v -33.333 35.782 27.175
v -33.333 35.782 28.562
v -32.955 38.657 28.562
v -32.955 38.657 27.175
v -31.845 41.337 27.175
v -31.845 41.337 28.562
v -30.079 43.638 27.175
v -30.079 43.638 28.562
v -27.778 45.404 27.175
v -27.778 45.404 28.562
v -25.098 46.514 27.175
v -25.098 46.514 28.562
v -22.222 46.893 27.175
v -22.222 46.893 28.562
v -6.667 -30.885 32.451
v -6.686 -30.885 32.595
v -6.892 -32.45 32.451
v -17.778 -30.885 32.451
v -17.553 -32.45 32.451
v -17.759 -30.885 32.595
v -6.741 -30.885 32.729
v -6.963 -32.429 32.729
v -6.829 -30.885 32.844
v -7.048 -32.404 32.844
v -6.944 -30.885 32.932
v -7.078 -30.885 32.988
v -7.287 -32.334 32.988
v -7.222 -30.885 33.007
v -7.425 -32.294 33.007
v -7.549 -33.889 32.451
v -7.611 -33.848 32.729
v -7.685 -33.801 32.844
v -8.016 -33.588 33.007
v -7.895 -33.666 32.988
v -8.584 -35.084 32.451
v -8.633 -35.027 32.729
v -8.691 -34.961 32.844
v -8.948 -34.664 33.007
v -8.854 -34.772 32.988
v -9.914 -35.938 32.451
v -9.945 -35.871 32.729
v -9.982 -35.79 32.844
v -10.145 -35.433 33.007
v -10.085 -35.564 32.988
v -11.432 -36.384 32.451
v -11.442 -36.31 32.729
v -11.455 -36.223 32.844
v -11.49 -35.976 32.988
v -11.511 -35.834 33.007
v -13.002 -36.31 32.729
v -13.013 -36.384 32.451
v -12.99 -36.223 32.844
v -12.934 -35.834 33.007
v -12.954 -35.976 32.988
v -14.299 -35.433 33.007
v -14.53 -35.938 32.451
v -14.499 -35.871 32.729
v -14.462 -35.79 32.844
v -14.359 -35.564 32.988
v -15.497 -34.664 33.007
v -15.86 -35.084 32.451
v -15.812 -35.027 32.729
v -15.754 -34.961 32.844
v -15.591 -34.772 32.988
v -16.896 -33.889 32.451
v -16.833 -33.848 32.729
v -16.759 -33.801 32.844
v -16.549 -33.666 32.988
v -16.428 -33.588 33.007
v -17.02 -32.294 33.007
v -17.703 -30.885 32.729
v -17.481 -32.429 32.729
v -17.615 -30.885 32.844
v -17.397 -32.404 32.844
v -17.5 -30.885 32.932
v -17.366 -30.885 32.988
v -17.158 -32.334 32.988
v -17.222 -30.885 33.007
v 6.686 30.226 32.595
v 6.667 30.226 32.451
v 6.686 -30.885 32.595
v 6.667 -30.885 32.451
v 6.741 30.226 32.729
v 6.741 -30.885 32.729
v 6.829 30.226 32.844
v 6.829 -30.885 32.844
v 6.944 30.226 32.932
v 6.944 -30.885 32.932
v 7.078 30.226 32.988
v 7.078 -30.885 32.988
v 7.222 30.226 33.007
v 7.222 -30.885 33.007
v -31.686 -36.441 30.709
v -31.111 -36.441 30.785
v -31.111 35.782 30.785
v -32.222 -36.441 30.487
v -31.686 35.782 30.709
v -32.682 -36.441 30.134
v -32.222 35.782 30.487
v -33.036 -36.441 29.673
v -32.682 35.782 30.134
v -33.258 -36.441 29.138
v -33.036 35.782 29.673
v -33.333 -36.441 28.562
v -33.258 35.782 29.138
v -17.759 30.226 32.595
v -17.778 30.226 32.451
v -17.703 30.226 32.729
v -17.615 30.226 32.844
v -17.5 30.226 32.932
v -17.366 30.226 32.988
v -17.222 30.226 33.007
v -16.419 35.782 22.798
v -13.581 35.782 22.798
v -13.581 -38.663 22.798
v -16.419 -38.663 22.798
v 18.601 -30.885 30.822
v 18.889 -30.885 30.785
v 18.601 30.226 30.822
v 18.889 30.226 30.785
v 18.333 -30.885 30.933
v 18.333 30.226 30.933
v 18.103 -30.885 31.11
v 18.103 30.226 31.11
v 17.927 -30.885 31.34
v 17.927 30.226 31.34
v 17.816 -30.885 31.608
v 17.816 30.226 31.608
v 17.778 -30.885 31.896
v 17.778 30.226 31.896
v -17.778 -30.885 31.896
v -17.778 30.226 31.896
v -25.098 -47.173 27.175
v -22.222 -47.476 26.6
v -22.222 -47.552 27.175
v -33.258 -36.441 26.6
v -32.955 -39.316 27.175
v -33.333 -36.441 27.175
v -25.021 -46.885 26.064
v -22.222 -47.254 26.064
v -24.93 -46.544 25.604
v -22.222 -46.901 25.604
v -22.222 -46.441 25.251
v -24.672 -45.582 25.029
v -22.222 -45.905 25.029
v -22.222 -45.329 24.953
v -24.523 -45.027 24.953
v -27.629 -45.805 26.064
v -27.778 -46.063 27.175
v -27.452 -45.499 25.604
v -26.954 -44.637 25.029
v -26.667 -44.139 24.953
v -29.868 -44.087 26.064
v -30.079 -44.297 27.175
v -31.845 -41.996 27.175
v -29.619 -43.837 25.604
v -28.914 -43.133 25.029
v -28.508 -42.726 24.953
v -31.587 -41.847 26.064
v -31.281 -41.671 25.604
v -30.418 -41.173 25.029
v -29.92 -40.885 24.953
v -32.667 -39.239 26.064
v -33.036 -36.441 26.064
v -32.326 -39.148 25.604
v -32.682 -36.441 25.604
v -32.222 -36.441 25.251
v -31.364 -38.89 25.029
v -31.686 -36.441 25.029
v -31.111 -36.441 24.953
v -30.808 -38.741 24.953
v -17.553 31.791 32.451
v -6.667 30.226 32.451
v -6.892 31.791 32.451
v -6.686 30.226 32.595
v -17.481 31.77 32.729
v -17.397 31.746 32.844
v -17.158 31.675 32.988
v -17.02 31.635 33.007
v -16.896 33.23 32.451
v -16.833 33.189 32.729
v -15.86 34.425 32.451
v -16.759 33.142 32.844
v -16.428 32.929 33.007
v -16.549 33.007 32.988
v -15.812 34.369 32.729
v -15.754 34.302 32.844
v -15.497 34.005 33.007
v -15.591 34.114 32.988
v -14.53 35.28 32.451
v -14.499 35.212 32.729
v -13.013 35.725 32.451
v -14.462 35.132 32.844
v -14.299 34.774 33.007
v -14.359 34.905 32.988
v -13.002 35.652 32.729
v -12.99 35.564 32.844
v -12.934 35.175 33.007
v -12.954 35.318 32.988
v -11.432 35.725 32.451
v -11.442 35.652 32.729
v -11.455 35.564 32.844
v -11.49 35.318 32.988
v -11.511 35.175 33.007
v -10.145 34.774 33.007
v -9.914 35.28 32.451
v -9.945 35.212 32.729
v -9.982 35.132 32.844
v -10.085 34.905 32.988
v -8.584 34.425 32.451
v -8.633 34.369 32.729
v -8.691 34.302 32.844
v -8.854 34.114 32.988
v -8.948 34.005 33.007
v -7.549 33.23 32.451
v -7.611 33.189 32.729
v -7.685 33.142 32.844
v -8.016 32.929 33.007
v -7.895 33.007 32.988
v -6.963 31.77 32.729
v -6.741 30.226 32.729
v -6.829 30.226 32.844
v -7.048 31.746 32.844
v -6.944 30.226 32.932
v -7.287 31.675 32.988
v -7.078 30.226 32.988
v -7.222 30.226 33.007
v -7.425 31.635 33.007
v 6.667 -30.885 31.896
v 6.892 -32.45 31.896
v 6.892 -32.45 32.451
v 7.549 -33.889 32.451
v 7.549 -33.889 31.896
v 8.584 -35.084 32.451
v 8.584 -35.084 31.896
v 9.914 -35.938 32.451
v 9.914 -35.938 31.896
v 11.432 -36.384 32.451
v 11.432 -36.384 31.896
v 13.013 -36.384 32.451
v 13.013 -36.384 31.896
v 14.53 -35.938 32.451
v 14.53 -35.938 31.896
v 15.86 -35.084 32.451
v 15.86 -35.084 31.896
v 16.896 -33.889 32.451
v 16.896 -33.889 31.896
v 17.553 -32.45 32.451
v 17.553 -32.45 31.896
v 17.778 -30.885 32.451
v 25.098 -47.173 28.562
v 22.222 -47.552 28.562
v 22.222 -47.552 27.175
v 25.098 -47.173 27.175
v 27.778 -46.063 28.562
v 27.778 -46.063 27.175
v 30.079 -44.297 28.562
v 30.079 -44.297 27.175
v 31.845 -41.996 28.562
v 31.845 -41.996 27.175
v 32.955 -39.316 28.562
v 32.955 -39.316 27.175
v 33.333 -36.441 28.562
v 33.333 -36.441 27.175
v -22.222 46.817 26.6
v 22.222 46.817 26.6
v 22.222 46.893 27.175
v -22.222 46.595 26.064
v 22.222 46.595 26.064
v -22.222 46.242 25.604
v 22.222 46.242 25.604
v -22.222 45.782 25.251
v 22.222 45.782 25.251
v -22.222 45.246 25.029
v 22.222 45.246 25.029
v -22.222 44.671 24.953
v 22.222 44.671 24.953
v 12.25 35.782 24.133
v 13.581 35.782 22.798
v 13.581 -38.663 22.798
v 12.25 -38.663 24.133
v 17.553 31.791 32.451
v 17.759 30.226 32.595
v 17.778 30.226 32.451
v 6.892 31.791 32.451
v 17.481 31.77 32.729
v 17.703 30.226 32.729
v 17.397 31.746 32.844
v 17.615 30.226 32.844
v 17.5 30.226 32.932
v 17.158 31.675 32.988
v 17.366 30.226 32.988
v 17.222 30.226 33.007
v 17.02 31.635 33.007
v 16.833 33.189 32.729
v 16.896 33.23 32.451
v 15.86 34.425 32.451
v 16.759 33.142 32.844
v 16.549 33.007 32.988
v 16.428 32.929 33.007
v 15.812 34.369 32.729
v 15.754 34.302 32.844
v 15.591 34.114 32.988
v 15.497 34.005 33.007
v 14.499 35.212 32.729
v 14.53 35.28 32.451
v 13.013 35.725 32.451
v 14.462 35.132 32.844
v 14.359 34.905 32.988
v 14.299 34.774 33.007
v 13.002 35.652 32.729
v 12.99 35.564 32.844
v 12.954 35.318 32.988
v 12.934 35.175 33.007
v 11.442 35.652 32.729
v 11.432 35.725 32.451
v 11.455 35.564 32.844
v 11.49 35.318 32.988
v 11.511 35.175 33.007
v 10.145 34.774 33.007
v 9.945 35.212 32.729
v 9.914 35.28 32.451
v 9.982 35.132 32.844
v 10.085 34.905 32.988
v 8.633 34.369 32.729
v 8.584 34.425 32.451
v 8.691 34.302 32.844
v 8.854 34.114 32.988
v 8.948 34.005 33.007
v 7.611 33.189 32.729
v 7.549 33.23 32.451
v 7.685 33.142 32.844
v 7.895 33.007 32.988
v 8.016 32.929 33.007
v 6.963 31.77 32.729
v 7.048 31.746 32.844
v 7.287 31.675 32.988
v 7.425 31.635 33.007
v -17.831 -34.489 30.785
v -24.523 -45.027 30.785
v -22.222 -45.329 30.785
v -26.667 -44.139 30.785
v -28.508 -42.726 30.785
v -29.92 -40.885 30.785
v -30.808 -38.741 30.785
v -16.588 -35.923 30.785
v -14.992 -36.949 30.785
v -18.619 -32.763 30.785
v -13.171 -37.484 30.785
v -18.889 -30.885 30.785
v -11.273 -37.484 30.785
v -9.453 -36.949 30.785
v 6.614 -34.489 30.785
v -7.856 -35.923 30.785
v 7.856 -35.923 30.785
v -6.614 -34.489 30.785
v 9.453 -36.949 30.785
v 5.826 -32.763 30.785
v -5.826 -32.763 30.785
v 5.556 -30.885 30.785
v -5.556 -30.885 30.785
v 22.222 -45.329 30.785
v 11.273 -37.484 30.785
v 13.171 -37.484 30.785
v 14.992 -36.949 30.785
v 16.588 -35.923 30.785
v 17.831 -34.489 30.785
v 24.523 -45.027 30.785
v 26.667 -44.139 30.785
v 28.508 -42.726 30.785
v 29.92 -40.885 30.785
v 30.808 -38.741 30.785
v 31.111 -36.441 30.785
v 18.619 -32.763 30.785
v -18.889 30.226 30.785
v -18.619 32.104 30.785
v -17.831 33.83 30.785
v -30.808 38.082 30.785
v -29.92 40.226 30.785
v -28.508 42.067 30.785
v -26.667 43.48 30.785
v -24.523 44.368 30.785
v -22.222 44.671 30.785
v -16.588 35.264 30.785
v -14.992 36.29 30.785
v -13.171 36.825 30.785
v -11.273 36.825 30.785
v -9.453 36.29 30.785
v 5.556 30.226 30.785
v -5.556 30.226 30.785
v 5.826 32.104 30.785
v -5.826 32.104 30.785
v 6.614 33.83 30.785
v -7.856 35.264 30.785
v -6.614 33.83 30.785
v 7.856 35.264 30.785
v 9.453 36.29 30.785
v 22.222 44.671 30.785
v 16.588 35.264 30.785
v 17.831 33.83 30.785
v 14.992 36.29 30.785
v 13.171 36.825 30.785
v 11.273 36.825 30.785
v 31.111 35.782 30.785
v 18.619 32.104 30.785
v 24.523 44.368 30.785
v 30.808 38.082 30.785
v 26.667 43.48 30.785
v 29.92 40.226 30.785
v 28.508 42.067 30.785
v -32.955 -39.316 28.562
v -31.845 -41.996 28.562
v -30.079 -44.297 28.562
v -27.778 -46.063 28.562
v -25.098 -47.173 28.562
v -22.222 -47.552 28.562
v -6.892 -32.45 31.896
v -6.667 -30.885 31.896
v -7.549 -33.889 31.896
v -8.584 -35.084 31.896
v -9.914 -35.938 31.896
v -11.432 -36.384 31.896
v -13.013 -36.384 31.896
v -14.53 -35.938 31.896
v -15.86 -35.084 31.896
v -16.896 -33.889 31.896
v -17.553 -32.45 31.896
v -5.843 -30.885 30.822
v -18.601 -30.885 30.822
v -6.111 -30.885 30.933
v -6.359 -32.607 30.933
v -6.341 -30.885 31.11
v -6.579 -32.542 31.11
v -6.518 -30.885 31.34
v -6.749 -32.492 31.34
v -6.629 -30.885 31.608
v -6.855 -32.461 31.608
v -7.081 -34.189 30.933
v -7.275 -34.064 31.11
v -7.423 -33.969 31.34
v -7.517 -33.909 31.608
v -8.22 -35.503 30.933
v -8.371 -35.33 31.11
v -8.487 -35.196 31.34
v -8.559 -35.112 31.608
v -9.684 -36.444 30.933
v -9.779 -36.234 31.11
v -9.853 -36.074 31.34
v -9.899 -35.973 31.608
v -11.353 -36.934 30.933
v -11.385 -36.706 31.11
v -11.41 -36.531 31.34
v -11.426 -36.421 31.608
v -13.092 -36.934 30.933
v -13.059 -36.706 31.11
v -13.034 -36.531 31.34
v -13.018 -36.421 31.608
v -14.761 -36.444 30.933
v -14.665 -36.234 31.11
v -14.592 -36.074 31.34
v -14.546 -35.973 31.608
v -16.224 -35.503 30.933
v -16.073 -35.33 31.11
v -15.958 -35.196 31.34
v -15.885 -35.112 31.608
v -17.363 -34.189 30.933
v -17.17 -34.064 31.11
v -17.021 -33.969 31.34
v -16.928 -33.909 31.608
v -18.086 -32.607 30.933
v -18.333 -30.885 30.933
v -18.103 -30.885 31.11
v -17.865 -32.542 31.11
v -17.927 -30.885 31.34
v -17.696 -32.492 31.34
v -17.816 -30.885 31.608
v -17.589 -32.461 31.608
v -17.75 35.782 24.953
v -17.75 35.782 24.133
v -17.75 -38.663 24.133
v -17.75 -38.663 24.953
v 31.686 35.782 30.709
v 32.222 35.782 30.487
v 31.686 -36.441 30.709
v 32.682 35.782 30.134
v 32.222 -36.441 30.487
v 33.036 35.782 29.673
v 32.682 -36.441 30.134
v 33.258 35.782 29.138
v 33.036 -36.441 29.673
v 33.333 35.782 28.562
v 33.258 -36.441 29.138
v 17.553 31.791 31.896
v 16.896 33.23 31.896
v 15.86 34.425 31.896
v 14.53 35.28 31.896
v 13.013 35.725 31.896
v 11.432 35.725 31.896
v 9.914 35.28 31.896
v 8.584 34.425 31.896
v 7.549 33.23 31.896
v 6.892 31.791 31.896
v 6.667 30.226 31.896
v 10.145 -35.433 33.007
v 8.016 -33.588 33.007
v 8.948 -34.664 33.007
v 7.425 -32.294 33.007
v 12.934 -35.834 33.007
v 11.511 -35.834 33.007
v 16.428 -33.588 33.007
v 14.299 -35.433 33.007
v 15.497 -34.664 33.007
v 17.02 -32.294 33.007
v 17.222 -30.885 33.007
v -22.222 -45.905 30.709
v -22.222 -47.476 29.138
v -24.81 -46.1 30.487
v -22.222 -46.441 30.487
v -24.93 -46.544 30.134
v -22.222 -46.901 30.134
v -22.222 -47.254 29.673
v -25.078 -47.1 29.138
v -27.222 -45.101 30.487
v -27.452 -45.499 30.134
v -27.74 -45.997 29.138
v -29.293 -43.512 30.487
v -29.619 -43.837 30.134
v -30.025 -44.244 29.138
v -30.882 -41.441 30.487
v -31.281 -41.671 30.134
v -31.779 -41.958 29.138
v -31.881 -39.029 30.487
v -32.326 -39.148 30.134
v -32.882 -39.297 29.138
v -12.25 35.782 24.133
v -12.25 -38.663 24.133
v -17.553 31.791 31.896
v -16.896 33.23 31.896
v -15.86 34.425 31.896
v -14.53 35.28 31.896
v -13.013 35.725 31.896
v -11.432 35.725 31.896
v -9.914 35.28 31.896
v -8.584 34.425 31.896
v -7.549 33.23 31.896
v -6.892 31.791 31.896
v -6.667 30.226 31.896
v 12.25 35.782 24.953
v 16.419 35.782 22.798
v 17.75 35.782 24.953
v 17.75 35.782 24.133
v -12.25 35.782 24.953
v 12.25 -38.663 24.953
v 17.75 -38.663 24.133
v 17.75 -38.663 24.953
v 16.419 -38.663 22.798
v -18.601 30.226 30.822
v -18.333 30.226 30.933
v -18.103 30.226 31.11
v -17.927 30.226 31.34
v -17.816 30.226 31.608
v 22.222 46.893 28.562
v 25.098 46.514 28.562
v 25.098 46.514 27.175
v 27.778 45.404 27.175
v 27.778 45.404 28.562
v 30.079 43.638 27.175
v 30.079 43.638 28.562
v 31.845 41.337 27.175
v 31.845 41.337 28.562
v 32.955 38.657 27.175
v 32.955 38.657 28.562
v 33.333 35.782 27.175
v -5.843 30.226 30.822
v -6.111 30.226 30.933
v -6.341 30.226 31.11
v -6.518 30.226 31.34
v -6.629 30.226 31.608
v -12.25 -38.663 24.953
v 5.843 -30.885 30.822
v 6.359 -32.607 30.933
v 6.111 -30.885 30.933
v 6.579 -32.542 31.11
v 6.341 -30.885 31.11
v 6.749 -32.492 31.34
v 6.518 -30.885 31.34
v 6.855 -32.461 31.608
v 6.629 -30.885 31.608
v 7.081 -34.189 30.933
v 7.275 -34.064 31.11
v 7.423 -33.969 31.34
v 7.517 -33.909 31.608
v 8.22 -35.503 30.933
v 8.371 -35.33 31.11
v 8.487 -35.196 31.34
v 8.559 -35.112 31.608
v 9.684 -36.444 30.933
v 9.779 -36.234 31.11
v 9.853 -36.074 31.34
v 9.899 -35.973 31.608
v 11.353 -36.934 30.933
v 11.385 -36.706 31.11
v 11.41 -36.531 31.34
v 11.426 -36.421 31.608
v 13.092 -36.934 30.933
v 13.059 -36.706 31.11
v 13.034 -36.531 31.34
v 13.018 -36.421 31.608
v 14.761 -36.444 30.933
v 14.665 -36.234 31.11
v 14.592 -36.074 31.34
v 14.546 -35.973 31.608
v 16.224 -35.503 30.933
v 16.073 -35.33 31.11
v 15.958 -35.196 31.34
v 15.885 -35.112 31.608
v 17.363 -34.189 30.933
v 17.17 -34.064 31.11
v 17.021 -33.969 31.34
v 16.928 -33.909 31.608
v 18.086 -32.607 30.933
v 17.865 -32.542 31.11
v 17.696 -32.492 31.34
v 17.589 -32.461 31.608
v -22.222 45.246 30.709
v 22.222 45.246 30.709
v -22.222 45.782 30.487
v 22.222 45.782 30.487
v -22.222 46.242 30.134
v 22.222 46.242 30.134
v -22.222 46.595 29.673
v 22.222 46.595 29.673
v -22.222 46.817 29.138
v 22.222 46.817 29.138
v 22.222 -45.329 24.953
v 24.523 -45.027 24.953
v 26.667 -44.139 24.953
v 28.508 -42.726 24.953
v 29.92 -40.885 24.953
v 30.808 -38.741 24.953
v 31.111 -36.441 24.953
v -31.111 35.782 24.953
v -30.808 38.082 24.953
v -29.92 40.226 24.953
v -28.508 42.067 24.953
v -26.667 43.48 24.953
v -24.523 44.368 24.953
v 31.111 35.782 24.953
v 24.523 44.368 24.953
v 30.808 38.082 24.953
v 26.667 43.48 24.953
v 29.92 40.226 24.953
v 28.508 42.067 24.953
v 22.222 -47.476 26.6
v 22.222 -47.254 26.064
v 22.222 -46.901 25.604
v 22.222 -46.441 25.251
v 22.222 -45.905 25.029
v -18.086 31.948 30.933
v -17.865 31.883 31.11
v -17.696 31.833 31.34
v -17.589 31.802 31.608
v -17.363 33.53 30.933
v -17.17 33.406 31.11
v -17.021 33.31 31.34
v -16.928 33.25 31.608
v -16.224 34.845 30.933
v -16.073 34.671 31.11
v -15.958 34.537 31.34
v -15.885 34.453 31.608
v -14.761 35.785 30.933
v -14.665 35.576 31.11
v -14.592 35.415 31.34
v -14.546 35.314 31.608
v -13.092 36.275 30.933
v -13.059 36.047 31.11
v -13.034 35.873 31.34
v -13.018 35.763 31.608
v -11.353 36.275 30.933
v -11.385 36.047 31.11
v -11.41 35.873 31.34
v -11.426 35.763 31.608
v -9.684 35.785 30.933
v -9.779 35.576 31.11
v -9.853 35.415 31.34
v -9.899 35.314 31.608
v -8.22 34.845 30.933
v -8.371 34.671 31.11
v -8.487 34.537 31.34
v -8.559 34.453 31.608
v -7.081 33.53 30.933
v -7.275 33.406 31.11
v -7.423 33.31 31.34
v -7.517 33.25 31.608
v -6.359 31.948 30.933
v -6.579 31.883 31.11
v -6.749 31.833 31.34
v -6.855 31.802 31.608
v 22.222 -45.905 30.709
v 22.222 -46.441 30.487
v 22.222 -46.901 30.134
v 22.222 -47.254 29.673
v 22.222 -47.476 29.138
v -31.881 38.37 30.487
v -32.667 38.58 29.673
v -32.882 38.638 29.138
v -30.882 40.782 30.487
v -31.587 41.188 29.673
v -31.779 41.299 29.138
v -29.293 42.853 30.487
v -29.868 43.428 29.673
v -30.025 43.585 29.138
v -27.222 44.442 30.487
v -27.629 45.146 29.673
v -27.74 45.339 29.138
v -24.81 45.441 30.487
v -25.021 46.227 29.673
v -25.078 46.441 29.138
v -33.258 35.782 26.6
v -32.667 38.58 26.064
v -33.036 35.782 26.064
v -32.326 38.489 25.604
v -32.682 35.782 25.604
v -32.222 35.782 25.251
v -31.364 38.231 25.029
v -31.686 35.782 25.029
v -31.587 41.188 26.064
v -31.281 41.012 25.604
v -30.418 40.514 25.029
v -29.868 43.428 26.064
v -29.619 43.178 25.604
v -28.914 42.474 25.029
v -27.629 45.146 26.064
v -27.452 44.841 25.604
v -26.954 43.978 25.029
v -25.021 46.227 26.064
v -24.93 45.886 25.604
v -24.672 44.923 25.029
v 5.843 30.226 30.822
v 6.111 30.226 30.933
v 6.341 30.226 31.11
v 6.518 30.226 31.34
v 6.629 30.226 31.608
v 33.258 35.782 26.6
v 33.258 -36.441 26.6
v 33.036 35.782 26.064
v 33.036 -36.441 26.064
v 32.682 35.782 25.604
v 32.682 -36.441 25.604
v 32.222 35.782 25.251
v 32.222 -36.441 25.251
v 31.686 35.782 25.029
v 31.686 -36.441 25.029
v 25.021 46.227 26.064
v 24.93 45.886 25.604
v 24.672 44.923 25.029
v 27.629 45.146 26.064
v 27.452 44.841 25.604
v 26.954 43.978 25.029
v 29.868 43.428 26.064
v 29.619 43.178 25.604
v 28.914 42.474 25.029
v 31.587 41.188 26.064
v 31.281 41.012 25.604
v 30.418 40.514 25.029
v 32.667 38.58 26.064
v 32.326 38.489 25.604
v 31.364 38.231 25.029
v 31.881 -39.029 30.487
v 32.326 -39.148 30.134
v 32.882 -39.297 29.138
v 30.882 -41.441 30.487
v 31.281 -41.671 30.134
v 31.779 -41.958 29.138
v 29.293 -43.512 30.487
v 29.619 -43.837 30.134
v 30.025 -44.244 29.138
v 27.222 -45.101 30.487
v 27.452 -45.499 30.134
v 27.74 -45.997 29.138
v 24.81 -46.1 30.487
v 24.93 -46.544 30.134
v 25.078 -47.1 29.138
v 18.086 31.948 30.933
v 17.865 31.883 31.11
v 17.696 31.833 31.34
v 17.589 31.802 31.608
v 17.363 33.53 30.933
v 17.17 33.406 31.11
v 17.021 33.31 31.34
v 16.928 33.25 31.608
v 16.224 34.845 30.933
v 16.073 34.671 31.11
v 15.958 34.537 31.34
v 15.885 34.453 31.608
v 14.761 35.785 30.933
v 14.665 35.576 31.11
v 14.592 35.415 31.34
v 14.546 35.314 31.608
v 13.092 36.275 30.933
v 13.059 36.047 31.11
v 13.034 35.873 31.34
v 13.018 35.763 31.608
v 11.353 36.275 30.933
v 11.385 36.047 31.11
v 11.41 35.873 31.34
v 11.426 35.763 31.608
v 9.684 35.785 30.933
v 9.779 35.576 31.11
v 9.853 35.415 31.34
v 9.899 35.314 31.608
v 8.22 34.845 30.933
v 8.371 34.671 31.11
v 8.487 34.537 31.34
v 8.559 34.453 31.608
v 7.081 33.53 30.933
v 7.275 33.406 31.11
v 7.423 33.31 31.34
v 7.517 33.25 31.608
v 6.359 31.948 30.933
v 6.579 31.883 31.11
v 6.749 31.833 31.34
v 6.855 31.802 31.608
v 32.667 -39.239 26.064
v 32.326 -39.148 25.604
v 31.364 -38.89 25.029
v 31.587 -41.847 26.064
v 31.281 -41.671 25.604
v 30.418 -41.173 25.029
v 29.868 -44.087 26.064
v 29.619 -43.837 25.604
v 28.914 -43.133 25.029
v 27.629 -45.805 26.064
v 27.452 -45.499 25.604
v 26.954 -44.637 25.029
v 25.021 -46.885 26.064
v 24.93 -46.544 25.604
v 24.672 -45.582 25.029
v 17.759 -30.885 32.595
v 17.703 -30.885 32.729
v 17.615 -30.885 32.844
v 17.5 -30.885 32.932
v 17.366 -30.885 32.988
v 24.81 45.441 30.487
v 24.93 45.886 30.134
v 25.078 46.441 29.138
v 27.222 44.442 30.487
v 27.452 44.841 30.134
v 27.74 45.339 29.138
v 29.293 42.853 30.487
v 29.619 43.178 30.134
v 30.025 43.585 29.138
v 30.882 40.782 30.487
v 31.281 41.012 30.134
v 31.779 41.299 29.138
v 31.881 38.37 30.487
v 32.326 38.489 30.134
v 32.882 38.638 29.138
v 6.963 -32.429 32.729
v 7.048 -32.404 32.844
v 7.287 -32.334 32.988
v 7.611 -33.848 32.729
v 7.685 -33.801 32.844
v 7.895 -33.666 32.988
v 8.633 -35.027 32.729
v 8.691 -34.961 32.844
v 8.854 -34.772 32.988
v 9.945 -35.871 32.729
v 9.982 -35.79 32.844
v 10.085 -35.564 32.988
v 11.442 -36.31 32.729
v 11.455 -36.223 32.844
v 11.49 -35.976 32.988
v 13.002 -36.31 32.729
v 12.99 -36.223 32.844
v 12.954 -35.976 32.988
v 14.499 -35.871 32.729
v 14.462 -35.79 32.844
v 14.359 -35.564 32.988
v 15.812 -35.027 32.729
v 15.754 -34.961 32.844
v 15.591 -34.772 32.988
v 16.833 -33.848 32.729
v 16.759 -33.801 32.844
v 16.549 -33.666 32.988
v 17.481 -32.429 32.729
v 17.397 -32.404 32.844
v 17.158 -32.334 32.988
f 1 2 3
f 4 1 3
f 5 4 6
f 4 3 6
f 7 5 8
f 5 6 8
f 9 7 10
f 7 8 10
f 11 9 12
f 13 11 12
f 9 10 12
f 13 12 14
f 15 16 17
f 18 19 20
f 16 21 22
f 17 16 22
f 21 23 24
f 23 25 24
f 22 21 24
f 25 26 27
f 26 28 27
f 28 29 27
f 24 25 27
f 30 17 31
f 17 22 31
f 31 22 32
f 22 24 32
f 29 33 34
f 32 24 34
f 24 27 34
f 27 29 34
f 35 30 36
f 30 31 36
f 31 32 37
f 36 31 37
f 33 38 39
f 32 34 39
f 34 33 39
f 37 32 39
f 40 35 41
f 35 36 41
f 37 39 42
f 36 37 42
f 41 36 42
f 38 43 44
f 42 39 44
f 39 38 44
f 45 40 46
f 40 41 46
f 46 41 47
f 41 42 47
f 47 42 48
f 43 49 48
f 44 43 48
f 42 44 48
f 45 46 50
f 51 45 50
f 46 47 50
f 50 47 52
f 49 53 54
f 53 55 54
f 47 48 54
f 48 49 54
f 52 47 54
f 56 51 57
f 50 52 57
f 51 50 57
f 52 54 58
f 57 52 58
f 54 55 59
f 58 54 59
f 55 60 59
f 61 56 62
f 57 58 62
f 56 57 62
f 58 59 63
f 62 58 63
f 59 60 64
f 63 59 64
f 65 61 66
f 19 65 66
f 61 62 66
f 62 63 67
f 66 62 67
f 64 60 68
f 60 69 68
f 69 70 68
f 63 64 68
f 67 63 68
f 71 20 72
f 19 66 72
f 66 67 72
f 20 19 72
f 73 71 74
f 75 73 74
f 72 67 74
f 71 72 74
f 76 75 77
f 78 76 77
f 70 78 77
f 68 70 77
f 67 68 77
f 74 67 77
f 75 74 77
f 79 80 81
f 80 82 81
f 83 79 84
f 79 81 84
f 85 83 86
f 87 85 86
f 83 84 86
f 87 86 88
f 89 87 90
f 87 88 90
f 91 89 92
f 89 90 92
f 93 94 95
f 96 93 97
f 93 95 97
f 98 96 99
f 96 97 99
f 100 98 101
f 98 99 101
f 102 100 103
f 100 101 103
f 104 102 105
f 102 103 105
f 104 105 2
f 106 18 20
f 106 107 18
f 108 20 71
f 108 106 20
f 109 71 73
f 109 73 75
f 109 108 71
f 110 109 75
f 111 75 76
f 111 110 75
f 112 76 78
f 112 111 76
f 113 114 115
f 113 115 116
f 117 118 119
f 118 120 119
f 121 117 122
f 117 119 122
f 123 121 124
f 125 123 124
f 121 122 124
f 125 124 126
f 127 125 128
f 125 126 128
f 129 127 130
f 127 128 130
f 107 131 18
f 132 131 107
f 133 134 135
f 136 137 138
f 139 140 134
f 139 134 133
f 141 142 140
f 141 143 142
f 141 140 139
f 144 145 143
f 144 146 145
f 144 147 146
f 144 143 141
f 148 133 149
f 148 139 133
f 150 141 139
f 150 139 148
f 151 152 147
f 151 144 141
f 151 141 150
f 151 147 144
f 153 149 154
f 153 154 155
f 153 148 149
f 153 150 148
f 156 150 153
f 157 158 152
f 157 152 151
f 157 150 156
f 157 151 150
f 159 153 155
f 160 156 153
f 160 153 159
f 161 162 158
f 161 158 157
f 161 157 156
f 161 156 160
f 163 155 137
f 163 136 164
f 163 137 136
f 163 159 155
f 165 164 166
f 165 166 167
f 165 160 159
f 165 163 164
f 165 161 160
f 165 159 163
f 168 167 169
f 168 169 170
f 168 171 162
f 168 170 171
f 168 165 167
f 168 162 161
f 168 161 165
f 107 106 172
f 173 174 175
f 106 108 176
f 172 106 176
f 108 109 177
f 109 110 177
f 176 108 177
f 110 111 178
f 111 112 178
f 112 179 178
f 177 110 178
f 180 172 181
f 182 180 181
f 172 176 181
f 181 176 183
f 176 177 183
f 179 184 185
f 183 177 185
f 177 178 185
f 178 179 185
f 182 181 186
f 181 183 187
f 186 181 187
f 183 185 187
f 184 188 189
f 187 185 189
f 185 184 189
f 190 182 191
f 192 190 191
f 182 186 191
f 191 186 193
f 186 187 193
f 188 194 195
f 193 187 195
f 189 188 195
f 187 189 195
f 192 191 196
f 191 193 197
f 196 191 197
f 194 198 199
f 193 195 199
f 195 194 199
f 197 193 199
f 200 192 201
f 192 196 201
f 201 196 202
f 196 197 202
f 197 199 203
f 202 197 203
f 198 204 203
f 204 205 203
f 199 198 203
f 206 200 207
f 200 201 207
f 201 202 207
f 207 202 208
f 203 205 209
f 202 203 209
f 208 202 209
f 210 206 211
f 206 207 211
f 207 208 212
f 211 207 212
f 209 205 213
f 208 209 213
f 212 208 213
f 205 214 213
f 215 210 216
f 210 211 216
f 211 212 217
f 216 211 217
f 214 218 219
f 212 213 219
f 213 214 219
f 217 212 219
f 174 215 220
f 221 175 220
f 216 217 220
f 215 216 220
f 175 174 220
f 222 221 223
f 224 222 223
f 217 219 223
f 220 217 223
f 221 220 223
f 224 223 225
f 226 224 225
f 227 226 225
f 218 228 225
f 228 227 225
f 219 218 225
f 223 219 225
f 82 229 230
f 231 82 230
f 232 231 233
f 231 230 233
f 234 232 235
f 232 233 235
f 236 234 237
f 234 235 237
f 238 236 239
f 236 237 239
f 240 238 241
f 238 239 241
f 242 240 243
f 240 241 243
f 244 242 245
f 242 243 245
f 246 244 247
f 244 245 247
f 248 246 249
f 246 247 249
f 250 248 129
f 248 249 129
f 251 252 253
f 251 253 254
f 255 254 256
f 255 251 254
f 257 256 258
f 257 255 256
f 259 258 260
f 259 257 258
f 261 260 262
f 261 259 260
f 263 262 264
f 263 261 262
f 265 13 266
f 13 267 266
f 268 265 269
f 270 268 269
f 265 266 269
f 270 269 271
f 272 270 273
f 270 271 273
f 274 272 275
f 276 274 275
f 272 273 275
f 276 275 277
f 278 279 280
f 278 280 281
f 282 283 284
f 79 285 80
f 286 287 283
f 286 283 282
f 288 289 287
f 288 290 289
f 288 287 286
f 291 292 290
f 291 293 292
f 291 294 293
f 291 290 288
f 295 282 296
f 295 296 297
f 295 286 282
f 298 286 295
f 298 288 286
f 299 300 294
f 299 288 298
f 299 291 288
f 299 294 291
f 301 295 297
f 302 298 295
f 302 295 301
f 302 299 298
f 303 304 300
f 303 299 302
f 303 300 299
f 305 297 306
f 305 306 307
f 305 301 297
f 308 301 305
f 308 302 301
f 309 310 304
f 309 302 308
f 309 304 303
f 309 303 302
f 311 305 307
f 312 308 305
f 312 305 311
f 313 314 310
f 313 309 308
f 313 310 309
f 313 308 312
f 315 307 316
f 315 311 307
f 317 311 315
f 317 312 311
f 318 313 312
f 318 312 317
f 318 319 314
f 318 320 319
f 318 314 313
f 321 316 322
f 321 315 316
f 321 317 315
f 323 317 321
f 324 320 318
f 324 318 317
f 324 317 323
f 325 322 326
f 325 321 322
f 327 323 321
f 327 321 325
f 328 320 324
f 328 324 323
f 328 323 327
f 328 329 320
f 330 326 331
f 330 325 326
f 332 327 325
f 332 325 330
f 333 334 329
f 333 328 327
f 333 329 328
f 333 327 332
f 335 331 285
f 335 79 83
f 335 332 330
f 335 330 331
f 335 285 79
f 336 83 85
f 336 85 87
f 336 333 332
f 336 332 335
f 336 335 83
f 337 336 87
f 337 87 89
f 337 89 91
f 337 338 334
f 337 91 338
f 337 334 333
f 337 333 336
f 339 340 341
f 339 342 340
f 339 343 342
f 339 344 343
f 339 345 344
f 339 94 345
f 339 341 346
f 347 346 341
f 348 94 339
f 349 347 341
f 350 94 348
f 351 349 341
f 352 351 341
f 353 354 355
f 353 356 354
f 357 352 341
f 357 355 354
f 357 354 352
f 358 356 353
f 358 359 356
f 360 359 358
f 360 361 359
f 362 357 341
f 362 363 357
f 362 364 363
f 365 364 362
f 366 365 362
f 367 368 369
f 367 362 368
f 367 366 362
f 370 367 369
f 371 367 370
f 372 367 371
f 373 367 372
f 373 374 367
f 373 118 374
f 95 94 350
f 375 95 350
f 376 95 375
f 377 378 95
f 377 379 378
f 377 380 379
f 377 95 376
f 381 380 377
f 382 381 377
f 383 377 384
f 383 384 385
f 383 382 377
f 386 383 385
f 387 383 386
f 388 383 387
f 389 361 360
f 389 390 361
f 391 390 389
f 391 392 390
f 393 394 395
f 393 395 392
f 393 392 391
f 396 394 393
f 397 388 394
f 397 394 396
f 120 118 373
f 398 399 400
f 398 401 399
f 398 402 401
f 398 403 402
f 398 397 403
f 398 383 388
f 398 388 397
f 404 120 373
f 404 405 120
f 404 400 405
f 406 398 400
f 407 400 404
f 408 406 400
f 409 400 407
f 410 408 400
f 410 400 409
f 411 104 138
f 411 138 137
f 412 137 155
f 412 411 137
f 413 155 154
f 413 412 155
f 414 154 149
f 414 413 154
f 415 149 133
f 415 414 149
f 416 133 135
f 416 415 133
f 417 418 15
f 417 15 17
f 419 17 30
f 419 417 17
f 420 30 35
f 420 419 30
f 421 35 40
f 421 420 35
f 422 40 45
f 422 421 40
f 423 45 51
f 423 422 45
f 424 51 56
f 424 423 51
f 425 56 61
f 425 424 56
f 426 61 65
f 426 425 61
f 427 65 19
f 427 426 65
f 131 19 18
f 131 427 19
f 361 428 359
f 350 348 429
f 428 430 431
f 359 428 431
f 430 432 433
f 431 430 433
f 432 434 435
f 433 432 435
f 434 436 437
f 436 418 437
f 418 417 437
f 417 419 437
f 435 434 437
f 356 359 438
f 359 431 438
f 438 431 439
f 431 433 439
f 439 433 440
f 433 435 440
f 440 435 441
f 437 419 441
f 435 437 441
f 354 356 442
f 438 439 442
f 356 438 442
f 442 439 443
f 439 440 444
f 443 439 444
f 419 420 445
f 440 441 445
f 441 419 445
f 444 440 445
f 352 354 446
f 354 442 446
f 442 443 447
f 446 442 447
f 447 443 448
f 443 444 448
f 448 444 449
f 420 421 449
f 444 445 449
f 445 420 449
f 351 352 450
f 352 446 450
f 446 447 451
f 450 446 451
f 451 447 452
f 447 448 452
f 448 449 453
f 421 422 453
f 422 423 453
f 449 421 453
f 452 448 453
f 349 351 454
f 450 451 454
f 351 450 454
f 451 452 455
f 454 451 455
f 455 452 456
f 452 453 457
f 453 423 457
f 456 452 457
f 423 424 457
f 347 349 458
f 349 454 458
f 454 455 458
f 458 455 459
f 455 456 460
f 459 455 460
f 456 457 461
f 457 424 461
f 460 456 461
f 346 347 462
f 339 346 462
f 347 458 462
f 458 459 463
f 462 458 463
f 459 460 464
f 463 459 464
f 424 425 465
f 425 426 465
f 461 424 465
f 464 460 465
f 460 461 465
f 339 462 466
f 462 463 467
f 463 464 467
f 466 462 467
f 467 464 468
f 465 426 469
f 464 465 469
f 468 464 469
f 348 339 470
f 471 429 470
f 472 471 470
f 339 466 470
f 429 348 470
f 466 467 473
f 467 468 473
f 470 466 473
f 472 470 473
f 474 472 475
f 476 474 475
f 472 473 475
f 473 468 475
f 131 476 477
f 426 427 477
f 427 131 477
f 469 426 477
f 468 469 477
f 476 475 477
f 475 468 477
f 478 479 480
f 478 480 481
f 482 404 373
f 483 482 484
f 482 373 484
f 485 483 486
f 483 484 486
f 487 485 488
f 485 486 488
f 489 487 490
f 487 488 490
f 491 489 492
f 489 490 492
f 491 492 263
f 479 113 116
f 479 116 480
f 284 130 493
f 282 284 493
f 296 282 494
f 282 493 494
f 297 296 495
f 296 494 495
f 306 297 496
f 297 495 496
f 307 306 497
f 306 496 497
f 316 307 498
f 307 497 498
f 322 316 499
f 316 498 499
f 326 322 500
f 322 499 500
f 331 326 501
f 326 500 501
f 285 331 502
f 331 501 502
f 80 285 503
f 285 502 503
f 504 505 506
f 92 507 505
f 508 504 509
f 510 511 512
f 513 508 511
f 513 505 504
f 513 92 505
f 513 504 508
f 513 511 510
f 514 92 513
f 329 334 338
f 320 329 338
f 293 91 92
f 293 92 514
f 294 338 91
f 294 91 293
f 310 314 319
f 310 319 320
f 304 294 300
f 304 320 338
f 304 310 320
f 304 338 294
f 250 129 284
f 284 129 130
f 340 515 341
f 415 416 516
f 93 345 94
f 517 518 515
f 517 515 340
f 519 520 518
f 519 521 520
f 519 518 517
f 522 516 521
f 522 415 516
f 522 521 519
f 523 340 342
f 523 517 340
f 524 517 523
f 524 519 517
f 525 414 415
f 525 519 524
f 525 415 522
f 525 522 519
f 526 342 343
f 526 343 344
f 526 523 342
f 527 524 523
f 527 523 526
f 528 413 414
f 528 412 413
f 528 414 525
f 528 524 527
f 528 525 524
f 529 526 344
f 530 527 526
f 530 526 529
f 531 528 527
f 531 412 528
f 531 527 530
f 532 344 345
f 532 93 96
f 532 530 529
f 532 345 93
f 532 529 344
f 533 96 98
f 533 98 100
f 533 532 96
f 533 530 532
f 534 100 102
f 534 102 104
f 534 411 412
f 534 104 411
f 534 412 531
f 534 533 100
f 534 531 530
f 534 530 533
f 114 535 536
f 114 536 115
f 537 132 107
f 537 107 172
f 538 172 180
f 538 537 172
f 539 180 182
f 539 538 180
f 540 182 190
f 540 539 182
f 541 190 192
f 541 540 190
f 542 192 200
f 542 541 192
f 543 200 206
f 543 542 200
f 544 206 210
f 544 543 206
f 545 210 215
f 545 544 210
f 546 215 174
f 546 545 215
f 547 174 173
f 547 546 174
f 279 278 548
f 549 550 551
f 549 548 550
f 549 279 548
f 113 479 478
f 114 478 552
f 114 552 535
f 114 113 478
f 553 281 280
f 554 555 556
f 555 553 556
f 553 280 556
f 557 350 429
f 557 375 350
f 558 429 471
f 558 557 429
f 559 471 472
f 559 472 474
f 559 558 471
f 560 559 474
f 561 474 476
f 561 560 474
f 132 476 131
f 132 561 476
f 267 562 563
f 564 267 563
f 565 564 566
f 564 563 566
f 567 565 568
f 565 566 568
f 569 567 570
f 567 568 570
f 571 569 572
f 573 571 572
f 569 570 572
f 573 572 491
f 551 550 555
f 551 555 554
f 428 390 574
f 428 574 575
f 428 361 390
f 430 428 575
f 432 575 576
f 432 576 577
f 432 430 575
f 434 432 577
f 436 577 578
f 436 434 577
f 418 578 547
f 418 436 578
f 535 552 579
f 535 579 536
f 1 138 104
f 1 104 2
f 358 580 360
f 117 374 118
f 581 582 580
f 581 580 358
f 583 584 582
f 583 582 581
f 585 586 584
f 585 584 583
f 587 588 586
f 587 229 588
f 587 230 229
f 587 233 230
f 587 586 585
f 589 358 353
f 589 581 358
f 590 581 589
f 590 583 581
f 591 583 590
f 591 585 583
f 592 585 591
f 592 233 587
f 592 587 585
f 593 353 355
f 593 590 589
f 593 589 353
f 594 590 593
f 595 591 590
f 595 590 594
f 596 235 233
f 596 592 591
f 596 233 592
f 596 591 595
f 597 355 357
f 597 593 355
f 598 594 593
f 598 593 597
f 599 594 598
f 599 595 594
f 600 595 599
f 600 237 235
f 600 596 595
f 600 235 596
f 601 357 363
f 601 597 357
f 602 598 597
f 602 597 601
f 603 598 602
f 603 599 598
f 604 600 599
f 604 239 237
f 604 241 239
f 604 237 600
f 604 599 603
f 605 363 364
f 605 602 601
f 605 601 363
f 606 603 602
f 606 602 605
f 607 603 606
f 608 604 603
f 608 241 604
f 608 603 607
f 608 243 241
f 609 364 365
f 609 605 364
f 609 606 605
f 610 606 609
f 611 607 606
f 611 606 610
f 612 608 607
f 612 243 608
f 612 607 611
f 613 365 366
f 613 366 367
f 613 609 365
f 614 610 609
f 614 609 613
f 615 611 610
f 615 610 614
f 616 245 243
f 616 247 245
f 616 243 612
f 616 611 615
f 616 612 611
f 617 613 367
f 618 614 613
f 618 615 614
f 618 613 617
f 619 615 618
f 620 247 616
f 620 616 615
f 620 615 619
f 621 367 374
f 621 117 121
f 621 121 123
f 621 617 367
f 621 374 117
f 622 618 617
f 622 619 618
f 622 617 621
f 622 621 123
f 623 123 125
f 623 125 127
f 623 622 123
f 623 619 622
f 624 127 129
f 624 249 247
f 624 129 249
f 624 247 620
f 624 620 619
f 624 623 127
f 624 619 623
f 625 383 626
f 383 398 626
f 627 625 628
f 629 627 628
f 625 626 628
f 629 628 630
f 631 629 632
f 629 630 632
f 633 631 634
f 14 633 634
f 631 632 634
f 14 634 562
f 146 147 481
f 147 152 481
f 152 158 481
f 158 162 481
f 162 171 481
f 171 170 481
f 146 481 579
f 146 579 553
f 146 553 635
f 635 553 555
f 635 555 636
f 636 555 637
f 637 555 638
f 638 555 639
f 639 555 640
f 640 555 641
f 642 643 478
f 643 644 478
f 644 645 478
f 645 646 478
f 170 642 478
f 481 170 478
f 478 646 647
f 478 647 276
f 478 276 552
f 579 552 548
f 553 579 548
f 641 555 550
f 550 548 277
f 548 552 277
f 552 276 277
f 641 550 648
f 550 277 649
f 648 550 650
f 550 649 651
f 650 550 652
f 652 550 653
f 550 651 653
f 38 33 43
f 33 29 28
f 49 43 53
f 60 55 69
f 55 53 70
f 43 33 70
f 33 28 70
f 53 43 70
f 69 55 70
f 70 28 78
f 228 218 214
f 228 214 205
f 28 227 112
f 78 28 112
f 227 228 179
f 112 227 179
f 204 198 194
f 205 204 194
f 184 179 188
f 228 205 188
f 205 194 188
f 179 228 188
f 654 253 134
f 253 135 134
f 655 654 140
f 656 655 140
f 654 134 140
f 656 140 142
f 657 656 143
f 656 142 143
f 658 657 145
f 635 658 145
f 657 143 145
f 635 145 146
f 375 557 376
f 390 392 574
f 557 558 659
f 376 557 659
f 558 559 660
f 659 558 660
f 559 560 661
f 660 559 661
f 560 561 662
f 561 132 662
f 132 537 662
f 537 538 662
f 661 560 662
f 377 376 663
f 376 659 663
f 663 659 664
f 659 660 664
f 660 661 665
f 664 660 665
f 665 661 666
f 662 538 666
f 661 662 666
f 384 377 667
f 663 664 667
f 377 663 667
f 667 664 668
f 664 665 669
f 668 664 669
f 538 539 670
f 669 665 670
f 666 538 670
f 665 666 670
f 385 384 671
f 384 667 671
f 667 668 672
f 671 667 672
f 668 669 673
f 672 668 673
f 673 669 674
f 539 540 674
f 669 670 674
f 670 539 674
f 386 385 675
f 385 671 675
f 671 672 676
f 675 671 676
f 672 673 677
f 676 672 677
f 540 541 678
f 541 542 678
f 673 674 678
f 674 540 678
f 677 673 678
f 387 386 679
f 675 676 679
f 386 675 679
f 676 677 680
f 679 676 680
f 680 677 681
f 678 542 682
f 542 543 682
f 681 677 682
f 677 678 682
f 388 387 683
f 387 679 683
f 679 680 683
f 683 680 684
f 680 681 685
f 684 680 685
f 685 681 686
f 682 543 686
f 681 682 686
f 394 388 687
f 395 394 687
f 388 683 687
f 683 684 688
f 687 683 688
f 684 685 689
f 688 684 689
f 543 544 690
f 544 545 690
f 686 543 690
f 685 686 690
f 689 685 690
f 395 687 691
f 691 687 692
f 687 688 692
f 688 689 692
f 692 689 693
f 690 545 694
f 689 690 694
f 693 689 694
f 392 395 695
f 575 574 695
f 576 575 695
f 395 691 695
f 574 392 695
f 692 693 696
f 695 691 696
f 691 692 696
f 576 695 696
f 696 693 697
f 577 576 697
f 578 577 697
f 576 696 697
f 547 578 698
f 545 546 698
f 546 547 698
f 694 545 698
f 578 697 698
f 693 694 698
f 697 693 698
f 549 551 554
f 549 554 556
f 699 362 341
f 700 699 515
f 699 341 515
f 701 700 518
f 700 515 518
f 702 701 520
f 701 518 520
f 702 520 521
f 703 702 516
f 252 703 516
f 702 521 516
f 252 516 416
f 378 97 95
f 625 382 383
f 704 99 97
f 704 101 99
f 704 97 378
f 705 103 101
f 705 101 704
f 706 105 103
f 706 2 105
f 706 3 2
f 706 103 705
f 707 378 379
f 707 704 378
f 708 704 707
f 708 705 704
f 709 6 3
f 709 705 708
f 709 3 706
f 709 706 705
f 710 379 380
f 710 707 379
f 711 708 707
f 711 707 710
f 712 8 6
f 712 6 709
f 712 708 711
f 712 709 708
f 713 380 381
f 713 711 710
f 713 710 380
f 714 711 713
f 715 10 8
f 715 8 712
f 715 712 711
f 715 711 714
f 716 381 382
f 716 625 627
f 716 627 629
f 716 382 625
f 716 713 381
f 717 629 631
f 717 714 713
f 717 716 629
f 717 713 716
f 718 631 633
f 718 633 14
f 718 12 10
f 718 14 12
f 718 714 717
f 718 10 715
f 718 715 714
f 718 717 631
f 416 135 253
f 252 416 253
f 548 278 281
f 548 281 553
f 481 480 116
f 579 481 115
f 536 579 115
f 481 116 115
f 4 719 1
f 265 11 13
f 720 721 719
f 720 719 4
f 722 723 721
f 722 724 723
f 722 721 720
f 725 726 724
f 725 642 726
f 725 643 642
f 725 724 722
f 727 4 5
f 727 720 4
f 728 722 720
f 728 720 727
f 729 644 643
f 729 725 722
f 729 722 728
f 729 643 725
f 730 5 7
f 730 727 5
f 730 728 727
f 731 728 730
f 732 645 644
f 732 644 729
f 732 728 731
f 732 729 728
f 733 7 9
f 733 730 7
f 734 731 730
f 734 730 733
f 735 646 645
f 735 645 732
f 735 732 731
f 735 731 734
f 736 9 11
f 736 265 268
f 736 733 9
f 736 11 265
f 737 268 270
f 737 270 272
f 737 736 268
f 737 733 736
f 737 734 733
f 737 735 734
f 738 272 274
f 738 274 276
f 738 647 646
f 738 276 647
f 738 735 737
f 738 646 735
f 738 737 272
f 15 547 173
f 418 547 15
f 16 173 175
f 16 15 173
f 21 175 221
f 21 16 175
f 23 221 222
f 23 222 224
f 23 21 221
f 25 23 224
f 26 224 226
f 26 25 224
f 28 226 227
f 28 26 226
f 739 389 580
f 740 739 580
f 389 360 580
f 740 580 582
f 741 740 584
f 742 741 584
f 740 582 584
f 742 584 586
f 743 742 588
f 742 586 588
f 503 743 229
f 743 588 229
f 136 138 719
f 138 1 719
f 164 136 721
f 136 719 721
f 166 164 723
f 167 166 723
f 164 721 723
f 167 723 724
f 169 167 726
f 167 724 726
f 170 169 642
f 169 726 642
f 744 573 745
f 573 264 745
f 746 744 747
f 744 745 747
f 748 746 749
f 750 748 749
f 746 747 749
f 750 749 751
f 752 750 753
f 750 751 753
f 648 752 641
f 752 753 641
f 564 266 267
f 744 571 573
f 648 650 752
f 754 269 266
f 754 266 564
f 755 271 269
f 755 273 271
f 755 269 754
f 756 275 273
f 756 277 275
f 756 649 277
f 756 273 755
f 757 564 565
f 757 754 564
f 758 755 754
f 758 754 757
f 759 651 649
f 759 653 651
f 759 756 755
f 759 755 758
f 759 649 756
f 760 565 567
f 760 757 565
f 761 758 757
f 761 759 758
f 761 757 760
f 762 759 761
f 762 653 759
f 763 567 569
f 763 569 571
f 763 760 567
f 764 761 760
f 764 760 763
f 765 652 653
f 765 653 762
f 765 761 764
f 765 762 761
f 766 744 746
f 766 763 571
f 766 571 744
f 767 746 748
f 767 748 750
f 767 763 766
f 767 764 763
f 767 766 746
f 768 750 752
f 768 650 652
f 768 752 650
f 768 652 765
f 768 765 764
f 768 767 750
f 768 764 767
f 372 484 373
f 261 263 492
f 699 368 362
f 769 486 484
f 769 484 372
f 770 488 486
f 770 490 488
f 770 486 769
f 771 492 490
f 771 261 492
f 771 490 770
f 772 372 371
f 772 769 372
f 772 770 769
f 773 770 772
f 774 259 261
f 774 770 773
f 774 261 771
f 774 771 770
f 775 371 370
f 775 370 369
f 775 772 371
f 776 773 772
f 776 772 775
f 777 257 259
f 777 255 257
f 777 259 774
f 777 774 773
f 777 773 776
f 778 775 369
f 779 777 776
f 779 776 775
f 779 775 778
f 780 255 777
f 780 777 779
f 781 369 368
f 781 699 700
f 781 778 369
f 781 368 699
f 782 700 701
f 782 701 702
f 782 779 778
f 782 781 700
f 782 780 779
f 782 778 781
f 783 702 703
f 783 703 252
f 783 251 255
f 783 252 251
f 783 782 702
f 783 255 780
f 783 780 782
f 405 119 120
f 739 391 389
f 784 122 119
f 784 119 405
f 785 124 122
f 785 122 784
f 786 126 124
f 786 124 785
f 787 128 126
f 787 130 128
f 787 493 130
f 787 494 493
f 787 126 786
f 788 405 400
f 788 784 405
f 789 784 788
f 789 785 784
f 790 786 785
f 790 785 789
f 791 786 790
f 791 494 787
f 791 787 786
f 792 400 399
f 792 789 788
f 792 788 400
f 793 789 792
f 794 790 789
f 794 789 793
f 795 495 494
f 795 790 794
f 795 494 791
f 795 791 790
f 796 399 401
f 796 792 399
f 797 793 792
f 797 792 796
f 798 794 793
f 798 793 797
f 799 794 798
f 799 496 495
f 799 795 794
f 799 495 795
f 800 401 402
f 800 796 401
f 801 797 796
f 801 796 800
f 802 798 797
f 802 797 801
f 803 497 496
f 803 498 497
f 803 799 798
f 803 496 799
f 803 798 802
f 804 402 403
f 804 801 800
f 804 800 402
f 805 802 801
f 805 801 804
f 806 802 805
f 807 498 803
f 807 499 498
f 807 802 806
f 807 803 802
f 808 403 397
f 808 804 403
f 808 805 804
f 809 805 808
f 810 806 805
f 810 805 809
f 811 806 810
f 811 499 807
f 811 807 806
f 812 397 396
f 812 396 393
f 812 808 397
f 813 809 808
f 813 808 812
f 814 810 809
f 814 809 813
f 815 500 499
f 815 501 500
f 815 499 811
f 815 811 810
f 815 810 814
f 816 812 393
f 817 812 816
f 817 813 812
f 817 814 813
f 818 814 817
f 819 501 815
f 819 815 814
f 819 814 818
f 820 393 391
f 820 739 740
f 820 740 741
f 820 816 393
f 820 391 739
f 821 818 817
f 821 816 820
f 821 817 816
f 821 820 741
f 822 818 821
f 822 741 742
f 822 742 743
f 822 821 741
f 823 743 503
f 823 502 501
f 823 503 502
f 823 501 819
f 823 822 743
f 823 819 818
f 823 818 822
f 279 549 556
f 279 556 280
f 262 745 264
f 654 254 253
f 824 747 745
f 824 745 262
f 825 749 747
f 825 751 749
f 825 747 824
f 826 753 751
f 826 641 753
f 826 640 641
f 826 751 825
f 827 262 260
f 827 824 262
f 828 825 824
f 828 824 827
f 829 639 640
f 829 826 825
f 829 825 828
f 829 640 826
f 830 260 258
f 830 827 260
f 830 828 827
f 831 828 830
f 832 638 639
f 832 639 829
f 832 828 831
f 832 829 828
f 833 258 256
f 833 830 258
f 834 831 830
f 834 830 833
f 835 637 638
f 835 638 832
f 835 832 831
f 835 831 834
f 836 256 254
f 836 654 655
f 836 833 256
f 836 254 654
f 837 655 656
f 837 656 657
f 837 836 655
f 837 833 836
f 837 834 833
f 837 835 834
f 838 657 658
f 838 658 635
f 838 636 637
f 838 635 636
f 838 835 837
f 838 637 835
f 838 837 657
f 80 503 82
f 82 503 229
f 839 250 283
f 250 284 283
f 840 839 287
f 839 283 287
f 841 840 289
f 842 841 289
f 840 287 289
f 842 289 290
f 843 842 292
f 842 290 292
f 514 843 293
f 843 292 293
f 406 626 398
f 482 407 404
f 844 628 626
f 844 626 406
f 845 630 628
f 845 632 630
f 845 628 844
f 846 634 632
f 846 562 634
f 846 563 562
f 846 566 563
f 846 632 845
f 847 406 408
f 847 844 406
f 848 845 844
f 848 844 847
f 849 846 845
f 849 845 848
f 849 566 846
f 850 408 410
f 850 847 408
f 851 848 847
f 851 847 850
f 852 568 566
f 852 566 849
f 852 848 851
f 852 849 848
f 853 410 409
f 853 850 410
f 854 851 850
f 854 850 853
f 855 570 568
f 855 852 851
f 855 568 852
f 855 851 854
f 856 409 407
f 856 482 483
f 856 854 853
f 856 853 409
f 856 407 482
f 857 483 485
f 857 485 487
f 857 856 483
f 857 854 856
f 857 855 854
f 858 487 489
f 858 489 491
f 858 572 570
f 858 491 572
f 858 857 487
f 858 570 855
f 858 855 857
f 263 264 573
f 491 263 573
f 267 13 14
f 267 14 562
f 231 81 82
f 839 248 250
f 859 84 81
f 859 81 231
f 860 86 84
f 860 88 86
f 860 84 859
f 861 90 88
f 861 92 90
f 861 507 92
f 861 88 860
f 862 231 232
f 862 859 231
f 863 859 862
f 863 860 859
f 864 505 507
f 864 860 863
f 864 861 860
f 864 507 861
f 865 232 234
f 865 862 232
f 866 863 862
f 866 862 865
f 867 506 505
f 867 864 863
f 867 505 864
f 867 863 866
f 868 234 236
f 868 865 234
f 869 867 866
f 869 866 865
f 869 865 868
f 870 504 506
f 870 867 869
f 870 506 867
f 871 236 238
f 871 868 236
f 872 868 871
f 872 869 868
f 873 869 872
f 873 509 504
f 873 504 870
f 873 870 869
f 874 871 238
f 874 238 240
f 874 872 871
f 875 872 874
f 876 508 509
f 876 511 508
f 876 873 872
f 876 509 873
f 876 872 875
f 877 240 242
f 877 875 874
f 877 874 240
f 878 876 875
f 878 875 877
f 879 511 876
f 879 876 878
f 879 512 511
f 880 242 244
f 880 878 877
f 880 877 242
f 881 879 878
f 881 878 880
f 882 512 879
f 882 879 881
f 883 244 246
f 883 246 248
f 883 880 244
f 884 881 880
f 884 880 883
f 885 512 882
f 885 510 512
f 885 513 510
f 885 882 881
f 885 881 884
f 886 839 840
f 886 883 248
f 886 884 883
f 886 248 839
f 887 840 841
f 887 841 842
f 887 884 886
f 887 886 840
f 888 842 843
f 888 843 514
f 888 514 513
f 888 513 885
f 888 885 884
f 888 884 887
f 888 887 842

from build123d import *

# Parameters (mm, degrees)
SKETCH_1_W      = 600
SKETCH_1_H      = 850
EXTRUDE_1_DEPTH = 52.484908593
EXTRUDE_2_DEPTH = 20
FILLET_1_R      = 100
FILLET_2_R      = 10
FILLET_3_R      = 5
FILLET_4_R      = 20
EXTRUDE_START   = -100
EXTRUDE_3_DEPTH = 670
SCALE_1_SCALE   = 0.111111111


with BuildPart() as part:
    # 草图1 → 凸台-拉伸1 (new body)
    with BuildSketch(Plane.XY):
        Rectangle(SKETCH_1_W, SKETCH_1_H)
    extrude(amount=EXTRUDE_1_DEPTH)

    # 草图2 → 凸台-拉伸2 (add)
    with BuildSketch(Plane.XY.offset(52.484908593)):
        with BuildLine():
            Line((-60, 275), (-60, -275))
            ThreePointArc((-60, -275), (-110, -325), (-160, -275))
            Line((-160, -275), (-160, 275))
            ThreePointArc((-160, 275), (-110, 325), (-60, 275))
        make_face()
        with BuildLine():
            Line((60, 275), (60, -275))
            ThreePointArc((60, -275), (110, -325), (160, -275))
            Line((160, -275), (160, 275))
            ThreePointArc((160, 275), (110, 325), (60, 275))
        make_face()
    extrude(amount=EXTRUDE_2_DEPTH)

    # 圆角1
    fillet_1_edges = [part.edges().sort_by_distance(p)[0] for p in [
        (300, -425, 26.242454296),
        (-300, -425, 26.242454296),
        (-300, 425, 26.242454296),
        (300, 425, 26.242454296),
    ]]
    fillet(fillet_1_edges, radius=FILLET_1_R)

    # 圆角2
    fillet_2_edges = [part.edges().sort_by_distance(p)[0] for p in [
        (-110, 325, 52.484908593),
        (-160, 0, 52.484908593),
        (-110, -325, 52.484908593),
        (-60, 0, 52.484908593),
        (110, 325, 52.484908593),
        (60, 0, 52.484908593),
        (110, -325, 52.484908593),
        (160, 0, 52.484908593),
    ]]
    fillet(fillet_2_edges, radius=FILLET_2_R)

    # 圆角3
    fillet_3_edges = [part.edges().sort_by_distance(p)[0] for p in [
        (-110, 325, 72.484908593),
        (-160, 0, 72.484908593),
        (-110, -325, 72.484908593),
        (-60, 0, 72.484908593),
        (110, 325, 72.484908593),
        (60, 0, 72.484908593),
        (110, -325, 72.484908593),
        (160, 0, 72.484908593),
    ]]
    fillet(fillet_3_edges, radius=FILLET_3_R)

    # 圆角4
    fillet_4_edges = [part.edges().sort_by_distance(p)[0] for p in [
        (0, 425, 0),
        (0, 425, 52.484908593),
        (300, 0, 0),
        (0, -425, 0),
        (-300, 0, 0),
        (-270.710678119, -395.710678119, 0),
        (270.710678119, -395.710678119, 0),
        (-270.710678119, 395.710678119, 0),
        (270.710678119, 395.710678119, 0),
        (300, 0, 52.484908593),
        (-300, 0, 52.484908593),
        (0, -425, 52.484908593),
        (-270.710678119, -395.710678119, 52.484908593),
        (270.710678119, -395.710678119, 52.484908593),
        (-270.710678119, 395.710678119, 52.484908593),
        (270.710678119, 395.710678119, 52.484908593),
    ]]
    fillet(fillet_4_edges, radius=FILLET_4_R)

    # 草图3 → 凸台-拉伸3 (add)
    with BuildSketch(Plane(origin=(0, 425, 0), x_dir=(1, 0, 0), z_dir=(0, 1, 0)).offset(EXTRUDE_START)):
        Polygon((-159.75, 0), (-110.25, 0), (-110.25, 7.38), (-122.225, 19.39), (-147.775, 19.39), (-159.75, 7.38), align=None)
        Polygon((159.75, 0), (159.75, 7.38), (147.775, 19.39), (122.225, 19.39), (110.25, 7.38), (110.25, 0), align=None)
    extrude(amount=-EXTRUDE_3_DEPTH)


with BuildPart() as part_1:
    # 缩放比例1: scaled about (0, -0.370563428, 28.072026876)
    add(part.part.scale(SCALE_1_SCALE).moved(Location((0, -0.329389714, 24.952912779))))


solid = part_1.part
